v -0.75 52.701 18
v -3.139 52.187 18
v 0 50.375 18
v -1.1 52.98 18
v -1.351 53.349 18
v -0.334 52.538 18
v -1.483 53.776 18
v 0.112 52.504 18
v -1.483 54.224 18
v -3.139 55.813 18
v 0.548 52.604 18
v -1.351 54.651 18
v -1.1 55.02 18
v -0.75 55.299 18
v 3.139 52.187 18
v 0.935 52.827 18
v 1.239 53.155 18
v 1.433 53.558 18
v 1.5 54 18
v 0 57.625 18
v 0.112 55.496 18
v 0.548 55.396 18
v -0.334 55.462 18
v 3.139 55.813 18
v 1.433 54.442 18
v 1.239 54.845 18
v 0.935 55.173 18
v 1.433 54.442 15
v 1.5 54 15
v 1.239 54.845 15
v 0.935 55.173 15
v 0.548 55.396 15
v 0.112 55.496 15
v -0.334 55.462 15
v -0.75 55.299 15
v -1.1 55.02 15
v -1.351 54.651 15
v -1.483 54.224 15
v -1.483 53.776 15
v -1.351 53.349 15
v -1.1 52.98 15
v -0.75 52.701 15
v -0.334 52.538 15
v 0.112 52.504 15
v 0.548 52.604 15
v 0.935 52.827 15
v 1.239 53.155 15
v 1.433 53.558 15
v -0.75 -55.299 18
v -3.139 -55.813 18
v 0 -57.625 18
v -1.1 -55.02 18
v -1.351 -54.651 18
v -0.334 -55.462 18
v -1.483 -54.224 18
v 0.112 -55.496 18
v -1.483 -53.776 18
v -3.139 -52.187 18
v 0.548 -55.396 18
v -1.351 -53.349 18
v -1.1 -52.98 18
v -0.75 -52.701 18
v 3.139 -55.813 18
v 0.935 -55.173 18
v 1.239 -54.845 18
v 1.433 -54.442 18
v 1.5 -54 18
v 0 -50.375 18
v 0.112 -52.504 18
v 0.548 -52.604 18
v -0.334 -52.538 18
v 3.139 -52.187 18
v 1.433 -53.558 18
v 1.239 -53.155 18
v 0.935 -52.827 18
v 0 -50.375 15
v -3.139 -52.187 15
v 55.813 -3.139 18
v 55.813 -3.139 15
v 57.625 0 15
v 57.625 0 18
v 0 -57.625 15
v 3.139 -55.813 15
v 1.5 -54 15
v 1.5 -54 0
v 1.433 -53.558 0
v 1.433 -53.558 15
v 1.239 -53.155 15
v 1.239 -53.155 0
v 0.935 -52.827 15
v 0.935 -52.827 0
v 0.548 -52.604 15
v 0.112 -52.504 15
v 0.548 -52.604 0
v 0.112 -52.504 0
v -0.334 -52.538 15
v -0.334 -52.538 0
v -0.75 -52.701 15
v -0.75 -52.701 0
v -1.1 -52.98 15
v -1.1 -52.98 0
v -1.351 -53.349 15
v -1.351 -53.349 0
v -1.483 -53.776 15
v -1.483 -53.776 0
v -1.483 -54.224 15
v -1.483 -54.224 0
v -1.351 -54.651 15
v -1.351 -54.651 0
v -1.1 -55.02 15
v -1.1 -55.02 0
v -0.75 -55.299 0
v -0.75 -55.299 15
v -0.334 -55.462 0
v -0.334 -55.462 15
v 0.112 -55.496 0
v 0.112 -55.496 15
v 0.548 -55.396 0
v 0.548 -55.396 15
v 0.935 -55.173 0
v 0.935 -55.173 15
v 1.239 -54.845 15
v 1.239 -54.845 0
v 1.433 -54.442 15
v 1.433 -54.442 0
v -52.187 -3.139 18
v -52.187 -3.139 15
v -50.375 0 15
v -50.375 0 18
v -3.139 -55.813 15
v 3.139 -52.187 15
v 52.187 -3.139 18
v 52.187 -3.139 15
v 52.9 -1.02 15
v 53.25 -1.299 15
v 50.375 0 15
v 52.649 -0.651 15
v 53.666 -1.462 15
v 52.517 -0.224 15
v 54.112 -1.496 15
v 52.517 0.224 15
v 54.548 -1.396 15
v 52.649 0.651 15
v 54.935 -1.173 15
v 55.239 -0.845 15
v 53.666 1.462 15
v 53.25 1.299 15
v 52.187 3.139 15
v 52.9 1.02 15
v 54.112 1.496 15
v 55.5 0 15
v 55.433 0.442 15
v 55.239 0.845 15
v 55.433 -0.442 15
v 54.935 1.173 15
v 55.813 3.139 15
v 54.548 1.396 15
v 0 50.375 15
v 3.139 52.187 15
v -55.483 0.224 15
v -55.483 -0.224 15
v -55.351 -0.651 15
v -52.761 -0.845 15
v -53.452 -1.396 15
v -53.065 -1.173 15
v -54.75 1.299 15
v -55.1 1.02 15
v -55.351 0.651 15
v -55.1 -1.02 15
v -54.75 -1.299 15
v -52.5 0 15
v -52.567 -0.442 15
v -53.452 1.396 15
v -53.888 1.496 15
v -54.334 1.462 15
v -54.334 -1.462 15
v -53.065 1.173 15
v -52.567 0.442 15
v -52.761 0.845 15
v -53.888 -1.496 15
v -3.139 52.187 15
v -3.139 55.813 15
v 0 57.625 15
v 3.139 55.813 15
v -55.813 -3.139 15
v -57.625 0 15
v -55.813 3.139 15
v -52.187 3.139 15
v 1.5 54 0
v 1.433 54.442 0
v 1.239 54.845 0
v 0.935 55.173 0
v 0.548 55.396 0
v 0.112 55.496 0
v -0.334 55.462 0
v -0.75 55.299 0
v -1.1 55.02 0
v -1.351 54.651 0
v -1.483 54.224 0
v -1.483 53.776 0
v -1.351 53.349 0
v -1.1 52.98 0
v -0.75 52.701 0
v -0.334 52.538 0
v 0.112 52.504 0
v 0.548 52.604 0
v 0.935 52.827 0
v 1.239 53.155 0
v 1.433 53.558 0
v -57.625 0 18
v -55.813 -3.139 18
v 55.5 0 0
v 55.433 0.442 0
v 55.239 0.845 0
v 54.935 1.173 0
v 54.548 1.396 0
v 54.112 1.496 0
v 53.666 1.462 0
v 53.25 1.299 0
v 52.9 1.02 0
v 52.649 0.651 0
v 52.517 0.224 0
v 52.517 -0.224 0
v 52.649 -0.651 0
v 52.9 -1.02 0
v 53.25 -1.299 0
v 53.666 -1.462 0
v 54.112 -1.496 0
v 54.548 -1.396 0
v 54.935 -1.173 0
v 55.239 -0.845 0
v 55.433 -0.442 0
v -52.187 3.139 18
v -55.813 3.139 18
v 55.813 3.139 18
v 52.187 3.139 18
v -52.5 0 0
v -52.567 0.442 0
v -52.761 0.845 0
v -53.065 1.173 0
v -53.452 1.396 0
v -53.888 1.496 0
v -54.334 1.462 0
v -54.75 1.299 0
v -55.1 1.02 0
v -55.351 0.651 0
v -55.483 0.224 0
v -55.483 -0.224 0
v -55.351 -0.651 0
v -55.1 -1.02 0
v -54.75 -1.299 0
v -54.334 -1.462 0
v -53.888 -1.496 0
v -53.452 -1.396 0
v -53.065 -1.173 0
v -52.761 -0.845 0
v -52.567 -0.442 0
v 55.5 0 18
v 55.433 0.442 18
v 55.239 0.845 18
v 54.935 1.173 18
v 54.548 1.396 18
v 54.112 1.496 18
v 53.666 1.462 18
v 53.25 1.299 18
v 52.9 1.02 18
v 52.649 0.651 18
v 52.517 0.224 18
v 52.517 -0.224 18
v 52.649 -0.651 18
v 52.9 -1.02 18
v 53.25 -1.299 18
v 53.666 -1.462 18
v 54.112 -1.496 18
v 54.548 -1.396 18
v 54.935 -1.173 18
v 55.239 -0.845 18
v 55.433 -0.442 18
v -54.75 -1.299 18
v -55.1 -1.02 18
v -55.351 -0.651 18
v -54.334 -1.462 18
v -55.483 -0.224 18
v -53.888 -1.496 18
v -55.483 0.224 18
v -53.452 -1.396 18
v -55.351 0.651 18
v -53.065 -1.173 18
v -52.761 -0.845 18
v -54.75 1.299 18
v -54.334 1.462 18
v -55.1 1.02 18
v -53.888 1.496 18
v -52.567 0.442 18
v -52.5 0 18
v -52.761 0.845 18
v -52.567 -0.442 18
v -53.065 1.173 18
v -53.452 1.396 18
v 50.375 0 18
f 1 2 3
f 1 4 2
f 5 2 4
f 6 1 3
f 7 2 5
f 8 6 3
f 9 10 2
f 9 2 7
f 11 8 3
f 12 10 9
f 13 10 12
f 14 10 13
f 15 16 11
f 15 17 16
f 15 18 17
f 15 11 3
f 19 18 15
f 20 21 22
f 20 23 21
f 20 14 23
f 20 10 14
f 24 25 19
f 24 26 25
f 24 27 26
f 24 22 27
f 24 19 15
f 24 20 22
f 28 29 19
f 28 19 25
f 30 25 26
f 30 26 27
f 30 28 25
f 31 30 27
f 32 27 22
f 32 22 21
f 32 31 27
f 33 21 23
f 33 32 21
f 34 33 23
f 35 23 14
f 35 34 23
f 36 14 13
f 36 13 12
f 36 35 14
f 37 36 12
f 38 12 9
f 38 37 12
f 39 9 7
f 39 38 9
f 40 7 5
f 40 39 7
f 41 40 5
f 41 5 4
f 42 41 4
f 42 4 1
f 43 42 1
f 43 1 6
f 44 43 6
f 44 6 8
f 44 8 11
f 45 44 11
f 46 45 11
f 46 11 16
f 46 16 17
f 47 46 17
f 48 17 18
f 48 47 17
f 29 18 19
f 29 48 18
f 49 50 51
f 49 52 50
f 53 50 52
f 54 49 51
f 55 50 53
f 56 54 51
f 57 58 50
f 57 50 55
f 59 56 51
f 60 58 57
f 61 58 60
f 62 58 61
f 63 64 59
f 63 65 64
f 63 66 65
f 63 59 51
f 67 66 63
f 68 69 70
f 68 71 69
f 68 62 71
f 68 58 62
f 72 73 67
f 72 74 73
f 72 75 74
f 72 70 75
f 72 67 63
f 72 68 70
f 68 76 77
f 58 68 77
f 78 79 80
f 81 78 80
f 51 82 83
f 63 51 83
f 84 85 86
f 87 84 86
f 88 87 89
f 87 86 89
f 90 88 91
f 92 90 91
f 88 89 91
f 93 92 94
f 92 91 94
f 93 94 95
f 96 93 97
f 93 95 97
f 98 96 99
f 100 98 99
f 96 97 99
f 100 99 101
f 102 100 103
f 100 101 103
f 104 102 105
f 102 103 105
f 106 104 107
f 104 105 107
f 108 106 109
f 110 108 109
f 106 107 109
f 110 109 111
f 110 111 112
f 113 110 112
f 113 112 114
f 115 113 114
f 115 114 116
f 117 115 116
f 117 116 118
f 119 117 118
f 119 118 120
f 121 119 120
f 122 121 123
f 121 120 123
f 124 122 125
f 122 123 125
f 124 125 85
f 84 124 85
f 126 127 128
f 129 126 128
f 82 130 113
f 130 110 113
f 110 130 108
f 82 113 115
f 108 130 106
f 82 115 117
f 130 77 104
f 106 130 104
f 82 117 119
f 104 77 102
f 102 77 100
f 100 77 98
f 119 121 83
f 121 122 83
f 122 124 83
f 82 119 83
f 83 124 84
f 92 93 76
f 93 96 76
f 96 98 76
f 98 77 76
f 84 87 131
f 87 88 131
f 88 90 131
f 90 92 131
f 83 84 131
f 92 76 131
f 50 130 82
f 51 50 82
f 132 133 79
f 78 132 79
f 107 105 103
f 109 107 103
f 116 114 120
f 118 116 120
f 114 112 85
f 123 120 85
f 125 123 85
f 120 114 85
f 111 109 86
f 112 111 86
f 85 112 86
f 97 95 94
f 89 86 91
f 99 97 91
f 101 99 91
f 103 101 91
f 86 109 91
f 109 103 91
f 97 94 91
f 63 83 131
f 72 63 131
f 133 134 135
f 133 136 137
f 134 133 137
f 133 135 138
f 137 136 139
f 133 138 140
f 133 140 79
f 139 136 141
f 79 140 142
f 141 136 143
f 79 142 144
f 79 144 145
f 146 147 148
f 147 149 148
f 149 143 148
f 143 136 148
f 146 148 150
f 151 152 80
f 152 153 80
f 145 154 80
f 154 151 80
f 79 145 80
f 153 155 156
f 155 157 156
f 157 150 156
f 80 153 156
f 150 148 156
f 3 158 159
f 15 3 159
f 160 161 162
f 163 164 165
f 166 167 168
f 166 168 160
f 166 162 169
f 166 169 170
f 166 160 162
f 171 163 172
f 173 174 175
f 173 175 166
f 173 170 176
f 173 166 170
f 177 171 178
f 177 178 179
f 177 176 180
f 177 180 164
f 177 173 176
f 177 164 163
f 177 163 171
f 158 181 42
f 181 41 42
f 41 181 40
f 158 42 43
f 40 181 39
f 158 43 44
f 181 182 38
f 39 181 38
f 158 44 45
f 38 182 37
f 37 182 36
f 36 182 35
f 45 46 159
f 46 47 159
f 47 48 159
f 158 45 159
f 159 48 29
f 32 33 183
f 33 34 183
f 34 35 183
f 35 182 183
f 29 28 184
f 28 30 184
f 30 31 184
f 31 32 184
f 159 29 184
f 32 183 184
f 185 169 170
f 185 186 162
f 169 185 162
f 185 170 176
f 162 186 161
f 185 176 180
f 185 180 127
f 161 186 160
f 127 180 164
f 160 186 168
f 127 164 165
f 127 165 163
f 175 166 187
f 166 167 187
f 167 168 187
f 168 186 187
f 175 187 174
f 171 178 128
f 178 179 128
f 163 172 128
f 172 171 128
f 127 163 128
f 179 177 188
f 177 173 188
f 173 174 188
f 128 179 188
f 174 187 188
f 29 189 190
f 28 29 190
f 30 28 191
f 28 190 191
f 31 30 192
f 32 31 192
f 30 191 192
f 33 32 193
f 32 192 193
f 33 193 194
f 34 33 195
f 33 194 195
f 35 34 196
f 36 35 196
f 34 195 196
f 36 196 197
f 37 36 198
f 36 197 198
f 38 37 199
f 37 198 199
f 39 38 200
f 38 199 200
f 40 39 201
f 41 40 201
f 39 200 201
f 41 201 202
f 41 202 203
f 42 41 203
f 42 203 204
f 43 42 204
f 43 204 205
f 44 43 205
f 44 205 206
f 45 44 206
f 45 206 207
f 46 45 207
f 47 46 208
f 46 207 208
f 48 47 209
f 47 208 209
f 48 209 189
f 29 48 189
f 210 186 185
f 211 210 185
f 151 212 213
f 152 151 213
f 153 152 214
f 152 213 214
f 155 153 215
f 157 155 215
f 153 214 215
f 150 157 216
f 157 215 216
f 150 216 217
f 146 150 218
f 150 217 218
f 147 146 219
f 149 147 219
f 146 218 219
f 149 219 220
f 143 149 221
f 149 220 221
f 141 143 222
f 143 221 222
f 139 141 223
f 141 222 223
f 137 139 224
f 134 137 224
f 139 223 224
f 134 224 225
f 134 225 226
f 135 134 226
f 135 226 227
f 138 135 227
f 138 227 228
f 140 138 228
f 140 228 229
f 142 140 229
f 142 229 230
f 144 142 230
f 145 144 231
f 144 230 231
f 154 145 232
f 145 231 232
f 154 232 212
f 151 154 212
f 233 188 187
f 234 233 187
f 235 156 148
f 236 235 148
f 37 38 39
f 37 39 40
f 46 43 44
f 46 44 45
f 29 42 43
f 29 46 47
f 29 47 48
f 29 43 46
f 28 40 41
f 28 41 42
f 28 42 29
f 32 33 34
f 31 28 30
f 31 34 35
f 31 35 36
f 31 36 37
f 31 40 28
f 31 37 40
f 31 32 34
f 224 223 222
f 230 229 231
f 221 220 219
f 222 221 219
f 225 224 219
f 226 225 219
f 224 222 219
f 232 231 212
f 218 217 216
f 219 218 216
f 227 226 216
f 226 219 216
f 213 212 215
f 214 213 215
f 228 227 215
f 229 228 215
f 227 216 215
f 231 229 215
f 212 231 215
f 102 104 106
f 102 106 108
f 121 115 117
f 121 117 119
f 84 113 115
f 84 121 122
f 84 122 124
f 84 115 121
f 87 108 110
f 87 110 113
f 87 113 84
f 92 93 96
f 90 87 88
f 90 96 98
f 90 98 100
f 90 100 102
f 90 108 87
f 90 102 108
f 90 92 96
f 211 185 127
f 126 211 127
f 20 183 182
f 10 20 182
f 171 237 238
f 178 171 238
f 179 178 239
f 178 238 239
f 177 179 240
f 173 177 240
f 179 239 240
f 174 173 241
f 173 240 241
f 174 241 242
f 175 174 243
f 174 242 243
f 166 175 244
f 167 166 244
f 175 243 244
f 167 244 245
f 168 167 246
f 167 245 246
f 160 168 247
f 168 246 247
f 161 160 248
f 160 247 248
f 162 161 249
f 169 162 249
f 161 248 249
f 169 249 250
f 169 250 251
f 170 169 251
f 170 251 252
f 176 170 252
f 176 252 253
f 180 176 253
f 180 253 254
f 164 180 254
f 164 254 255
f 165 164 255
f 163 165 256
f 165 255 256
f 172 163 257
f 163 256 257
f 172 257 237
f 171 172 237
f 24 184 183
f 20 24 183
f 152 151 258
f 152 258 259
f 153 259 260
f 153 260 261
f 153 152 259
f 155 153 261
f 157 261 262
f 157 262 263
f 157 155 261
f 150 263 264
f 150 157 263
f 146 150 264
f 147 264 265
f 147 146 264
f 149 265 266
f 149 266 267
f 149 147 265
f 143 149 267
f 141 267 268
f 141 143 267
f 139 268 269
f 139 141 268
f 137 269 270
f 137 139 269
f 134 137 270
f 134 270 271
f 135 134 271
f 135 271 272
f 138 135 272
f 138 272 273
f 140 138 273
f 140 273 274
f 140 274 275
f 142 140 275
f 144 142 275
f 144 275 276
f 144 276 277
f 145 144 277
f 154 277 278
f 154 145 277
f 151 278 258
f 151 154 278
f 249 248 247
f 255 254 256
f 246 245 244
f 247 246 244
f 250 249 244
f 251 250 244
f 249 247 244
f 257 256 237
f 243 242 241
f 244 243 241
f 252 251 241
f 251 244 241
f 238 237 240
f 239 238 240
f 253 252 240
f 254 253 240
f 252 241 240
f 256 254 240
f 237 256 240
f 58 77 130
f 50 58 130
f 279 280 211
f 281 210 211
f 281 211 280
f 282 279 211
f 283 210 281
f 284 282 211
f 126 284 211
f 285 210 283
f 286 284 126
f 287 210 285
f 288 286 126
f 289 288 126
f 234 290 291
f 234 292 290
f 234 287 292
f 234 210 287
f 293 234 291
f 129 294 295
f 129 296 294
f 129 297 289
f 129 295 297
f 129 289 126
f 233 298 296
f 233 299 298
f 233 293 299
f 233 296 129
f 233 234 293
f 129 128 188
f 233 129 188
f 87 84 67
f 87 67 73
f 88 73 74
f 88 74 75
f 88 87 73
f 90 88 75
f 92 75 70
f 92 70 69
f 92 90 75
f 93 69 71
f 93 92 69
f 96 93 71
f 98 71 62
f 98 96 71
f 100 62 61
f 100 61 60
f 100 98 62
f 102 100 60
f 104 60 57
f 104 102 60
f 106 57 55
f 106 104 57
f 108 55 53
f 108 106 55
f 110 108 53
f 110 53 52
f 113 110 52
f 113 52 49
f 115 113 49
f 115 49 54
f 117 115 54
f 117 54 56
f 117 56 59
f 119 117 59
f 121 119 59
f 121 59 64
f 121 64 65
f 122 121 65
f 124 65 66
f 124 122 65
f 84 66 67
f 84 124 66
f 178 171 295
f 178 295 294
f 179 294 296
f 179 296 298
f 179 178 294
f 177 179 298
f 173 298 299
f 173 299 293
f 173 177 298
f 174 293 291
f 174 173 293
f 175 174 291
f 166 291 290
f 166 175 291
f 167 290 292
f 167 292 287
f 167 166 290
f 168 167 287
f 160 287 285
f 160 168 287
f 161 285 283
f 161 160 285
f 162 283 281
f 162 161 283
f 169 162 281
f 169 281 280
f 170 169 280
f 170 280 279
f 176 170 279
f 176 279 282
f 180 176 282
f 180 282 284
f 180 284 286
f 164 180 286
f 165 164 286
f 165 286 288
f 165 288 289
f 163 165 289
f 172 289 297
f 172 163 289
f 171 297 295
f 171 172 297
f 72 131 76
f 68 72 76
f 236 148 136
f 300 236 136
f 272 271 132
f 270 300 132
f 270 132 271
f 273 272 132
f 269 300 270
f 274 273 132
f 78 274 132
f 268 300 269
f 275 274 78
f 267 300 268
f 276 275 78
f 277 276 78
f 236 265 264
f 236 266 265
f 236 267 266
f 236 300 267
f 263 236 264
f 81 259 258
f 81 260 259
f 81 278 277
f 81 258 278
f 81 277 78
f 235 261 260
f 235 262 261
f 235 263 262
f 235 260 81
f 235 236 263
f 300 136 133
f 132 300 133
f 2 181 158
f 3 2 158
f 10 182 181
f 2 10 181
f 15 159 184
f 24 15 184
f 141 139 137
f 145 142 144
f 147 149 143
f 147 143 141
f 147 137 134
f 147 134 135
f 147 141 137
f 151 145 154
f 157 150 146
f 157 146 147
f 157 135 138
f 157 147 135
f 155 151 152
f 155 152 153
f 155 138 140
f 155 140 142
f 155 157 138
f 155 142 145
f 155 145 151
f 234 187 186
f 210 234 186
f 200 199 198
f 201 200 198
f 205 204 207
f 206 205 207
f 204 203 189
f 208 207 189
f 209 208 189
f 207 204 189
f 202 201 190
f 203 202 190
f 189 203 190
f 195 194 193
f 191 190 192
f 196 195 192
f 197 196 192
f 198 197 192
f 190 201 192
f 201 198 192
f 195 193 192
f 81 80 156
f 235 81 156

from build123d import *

# Parameters (mm, degrees)
SKETCH2_R             = 1.5
BOSS_EXTRUDE1_DEPTH   = 15
BOSS_EXTRUDE1_2_DEPTH = 15
BOSS_EXTRUDE1_3_DEPTH = 15
BOSS_EXTRUDE1_4_DEPTH = 15
SKETCH3_R             = 1.5
BOSS_EXTRUDE2_DEPTH   = 3
BOSS_EXTRUDE2_2_DEPTH = 3
BOSS_EXTRUDE2_3_DEPTH = 3
BOSS_EXTRUDE2_4_DEPTH = 3


with BuildPart() as part:
    # Sketch2 → Boss-Extrude1 (new body)
    with BuildSketch(Plane.XY):
        with Locations((0, 54)):
            Circle(SKETCH2_R)
    extrude(amount=BOSS_EXTRUDE1_DEPTH)


with BuildPart() as body_2:
    # Sketch2 → Boss-Extrude1 2 (new body)
    with BuildSketch(Plane.XY):
        with Locations((54, 0)):
            Circle(SKETCH2_R)
    extrude(amount=BOSS_EXTRUDE1_2_DEPTH)


with BuildPart() as body_3:
    # Sketch2 → Boss-Extrude1 3 (new body)
    with BuildSketch(Plane.XY):
        with Locations((0, -54)):
            Circle(SKETCH2_R)
    extrude(amount=BOSS_EXTRUDE1_3_DEPTH)


with BuildPart() as body_4:
    # Sketch2 → Boss-Extrude1 4 (new body)
    with BuildSketch(Plane.XY):
        with Locations((-54, 0)):
            Circle(SKETCH2_R)
    extrude(amount=BOSS_EXTRUDE1_4_DEPTH)


with BuildPart() as body_5:
    # Sketch3 → Boss-Extrude2 (new body)
    with BuildSketch(Plane.XY.offset(15)):
        Polygon((55.812572411, -3.139467508), (57.625144822, 0), (55.812572411, 3.139467508), (52.187427589, 3.139467508), (50.374855178, 0), (52.187427589, -3.139467508), align=None)
        with Locations((54, 0)):
            Circle(SKETCH3_R, mode=Mode.SUBTRACT)
    extrude(amount=BOSS_EXTRUDE2_DEPTH)


with BuildPart() as body_6:
    # Sketch3 → Boss-Extrude2 2 (new body)
    with BuildSketch(Plane.XY.offset(15)):
        Polygon((3.139467508, 55.812572411), (0, 57.625144822), (-3.139467508, 55.812572411), (-3.139467508, 52.187427589), (0, 50.374855178), (3.139467508, 52.187427589), align=None)
        with Locations((0, 54)):
            Circle(SKETCH3_R, mode=Mode.SUBTRACT)
    extrude(amount=BOSS_EXTRUDE2_2_DEPTH)


with BuildPart() as body_7:
    # Sketch3 → Boss-Extrude2 3 (new body)
    with BuildSketch(Plane.XY.offset(15)):
        Polygon((-3.139467508, -55.812572411), (0, -57.625144822), (3.139467508, -55.812572411), (3.139467508, -52.187427589), (0, -50.374855178), (-3.139467508, -52.187427589), align=None)
        with Locations((0, -54)):
            Circle(SKETCH3_R, mode=Mode.SUBTRACT)
    extrude(amount=BOSS_EXTRUDE2_3_DEPTH)


with BuildPart() as body_8:
    # Sketch3 → Boss-Extrude2 4 (new body)
    with BuildSketch(Plane.XY.offset(15)):
        Polygon((-55.812572411, 3.139467508), (-57.625144822, 0), (-55.812572411, -3.139467508), (-52.187427589, -3.139467508), (-50.374855178, 0), (-52.187427589, 3.139467508), align=None)
        with Locations((-54, 0)):
            Circle(SKETCH3_R, mode=Mode.SUBTRACT)
    extrude(amount=BOSS_EXTRUDE2_4_DEPTH)


solid = Compound([part.part, body_2.part, body_3.part, body_4.part, body_5.part, body_6.part, body_7.part, body_8.part])
